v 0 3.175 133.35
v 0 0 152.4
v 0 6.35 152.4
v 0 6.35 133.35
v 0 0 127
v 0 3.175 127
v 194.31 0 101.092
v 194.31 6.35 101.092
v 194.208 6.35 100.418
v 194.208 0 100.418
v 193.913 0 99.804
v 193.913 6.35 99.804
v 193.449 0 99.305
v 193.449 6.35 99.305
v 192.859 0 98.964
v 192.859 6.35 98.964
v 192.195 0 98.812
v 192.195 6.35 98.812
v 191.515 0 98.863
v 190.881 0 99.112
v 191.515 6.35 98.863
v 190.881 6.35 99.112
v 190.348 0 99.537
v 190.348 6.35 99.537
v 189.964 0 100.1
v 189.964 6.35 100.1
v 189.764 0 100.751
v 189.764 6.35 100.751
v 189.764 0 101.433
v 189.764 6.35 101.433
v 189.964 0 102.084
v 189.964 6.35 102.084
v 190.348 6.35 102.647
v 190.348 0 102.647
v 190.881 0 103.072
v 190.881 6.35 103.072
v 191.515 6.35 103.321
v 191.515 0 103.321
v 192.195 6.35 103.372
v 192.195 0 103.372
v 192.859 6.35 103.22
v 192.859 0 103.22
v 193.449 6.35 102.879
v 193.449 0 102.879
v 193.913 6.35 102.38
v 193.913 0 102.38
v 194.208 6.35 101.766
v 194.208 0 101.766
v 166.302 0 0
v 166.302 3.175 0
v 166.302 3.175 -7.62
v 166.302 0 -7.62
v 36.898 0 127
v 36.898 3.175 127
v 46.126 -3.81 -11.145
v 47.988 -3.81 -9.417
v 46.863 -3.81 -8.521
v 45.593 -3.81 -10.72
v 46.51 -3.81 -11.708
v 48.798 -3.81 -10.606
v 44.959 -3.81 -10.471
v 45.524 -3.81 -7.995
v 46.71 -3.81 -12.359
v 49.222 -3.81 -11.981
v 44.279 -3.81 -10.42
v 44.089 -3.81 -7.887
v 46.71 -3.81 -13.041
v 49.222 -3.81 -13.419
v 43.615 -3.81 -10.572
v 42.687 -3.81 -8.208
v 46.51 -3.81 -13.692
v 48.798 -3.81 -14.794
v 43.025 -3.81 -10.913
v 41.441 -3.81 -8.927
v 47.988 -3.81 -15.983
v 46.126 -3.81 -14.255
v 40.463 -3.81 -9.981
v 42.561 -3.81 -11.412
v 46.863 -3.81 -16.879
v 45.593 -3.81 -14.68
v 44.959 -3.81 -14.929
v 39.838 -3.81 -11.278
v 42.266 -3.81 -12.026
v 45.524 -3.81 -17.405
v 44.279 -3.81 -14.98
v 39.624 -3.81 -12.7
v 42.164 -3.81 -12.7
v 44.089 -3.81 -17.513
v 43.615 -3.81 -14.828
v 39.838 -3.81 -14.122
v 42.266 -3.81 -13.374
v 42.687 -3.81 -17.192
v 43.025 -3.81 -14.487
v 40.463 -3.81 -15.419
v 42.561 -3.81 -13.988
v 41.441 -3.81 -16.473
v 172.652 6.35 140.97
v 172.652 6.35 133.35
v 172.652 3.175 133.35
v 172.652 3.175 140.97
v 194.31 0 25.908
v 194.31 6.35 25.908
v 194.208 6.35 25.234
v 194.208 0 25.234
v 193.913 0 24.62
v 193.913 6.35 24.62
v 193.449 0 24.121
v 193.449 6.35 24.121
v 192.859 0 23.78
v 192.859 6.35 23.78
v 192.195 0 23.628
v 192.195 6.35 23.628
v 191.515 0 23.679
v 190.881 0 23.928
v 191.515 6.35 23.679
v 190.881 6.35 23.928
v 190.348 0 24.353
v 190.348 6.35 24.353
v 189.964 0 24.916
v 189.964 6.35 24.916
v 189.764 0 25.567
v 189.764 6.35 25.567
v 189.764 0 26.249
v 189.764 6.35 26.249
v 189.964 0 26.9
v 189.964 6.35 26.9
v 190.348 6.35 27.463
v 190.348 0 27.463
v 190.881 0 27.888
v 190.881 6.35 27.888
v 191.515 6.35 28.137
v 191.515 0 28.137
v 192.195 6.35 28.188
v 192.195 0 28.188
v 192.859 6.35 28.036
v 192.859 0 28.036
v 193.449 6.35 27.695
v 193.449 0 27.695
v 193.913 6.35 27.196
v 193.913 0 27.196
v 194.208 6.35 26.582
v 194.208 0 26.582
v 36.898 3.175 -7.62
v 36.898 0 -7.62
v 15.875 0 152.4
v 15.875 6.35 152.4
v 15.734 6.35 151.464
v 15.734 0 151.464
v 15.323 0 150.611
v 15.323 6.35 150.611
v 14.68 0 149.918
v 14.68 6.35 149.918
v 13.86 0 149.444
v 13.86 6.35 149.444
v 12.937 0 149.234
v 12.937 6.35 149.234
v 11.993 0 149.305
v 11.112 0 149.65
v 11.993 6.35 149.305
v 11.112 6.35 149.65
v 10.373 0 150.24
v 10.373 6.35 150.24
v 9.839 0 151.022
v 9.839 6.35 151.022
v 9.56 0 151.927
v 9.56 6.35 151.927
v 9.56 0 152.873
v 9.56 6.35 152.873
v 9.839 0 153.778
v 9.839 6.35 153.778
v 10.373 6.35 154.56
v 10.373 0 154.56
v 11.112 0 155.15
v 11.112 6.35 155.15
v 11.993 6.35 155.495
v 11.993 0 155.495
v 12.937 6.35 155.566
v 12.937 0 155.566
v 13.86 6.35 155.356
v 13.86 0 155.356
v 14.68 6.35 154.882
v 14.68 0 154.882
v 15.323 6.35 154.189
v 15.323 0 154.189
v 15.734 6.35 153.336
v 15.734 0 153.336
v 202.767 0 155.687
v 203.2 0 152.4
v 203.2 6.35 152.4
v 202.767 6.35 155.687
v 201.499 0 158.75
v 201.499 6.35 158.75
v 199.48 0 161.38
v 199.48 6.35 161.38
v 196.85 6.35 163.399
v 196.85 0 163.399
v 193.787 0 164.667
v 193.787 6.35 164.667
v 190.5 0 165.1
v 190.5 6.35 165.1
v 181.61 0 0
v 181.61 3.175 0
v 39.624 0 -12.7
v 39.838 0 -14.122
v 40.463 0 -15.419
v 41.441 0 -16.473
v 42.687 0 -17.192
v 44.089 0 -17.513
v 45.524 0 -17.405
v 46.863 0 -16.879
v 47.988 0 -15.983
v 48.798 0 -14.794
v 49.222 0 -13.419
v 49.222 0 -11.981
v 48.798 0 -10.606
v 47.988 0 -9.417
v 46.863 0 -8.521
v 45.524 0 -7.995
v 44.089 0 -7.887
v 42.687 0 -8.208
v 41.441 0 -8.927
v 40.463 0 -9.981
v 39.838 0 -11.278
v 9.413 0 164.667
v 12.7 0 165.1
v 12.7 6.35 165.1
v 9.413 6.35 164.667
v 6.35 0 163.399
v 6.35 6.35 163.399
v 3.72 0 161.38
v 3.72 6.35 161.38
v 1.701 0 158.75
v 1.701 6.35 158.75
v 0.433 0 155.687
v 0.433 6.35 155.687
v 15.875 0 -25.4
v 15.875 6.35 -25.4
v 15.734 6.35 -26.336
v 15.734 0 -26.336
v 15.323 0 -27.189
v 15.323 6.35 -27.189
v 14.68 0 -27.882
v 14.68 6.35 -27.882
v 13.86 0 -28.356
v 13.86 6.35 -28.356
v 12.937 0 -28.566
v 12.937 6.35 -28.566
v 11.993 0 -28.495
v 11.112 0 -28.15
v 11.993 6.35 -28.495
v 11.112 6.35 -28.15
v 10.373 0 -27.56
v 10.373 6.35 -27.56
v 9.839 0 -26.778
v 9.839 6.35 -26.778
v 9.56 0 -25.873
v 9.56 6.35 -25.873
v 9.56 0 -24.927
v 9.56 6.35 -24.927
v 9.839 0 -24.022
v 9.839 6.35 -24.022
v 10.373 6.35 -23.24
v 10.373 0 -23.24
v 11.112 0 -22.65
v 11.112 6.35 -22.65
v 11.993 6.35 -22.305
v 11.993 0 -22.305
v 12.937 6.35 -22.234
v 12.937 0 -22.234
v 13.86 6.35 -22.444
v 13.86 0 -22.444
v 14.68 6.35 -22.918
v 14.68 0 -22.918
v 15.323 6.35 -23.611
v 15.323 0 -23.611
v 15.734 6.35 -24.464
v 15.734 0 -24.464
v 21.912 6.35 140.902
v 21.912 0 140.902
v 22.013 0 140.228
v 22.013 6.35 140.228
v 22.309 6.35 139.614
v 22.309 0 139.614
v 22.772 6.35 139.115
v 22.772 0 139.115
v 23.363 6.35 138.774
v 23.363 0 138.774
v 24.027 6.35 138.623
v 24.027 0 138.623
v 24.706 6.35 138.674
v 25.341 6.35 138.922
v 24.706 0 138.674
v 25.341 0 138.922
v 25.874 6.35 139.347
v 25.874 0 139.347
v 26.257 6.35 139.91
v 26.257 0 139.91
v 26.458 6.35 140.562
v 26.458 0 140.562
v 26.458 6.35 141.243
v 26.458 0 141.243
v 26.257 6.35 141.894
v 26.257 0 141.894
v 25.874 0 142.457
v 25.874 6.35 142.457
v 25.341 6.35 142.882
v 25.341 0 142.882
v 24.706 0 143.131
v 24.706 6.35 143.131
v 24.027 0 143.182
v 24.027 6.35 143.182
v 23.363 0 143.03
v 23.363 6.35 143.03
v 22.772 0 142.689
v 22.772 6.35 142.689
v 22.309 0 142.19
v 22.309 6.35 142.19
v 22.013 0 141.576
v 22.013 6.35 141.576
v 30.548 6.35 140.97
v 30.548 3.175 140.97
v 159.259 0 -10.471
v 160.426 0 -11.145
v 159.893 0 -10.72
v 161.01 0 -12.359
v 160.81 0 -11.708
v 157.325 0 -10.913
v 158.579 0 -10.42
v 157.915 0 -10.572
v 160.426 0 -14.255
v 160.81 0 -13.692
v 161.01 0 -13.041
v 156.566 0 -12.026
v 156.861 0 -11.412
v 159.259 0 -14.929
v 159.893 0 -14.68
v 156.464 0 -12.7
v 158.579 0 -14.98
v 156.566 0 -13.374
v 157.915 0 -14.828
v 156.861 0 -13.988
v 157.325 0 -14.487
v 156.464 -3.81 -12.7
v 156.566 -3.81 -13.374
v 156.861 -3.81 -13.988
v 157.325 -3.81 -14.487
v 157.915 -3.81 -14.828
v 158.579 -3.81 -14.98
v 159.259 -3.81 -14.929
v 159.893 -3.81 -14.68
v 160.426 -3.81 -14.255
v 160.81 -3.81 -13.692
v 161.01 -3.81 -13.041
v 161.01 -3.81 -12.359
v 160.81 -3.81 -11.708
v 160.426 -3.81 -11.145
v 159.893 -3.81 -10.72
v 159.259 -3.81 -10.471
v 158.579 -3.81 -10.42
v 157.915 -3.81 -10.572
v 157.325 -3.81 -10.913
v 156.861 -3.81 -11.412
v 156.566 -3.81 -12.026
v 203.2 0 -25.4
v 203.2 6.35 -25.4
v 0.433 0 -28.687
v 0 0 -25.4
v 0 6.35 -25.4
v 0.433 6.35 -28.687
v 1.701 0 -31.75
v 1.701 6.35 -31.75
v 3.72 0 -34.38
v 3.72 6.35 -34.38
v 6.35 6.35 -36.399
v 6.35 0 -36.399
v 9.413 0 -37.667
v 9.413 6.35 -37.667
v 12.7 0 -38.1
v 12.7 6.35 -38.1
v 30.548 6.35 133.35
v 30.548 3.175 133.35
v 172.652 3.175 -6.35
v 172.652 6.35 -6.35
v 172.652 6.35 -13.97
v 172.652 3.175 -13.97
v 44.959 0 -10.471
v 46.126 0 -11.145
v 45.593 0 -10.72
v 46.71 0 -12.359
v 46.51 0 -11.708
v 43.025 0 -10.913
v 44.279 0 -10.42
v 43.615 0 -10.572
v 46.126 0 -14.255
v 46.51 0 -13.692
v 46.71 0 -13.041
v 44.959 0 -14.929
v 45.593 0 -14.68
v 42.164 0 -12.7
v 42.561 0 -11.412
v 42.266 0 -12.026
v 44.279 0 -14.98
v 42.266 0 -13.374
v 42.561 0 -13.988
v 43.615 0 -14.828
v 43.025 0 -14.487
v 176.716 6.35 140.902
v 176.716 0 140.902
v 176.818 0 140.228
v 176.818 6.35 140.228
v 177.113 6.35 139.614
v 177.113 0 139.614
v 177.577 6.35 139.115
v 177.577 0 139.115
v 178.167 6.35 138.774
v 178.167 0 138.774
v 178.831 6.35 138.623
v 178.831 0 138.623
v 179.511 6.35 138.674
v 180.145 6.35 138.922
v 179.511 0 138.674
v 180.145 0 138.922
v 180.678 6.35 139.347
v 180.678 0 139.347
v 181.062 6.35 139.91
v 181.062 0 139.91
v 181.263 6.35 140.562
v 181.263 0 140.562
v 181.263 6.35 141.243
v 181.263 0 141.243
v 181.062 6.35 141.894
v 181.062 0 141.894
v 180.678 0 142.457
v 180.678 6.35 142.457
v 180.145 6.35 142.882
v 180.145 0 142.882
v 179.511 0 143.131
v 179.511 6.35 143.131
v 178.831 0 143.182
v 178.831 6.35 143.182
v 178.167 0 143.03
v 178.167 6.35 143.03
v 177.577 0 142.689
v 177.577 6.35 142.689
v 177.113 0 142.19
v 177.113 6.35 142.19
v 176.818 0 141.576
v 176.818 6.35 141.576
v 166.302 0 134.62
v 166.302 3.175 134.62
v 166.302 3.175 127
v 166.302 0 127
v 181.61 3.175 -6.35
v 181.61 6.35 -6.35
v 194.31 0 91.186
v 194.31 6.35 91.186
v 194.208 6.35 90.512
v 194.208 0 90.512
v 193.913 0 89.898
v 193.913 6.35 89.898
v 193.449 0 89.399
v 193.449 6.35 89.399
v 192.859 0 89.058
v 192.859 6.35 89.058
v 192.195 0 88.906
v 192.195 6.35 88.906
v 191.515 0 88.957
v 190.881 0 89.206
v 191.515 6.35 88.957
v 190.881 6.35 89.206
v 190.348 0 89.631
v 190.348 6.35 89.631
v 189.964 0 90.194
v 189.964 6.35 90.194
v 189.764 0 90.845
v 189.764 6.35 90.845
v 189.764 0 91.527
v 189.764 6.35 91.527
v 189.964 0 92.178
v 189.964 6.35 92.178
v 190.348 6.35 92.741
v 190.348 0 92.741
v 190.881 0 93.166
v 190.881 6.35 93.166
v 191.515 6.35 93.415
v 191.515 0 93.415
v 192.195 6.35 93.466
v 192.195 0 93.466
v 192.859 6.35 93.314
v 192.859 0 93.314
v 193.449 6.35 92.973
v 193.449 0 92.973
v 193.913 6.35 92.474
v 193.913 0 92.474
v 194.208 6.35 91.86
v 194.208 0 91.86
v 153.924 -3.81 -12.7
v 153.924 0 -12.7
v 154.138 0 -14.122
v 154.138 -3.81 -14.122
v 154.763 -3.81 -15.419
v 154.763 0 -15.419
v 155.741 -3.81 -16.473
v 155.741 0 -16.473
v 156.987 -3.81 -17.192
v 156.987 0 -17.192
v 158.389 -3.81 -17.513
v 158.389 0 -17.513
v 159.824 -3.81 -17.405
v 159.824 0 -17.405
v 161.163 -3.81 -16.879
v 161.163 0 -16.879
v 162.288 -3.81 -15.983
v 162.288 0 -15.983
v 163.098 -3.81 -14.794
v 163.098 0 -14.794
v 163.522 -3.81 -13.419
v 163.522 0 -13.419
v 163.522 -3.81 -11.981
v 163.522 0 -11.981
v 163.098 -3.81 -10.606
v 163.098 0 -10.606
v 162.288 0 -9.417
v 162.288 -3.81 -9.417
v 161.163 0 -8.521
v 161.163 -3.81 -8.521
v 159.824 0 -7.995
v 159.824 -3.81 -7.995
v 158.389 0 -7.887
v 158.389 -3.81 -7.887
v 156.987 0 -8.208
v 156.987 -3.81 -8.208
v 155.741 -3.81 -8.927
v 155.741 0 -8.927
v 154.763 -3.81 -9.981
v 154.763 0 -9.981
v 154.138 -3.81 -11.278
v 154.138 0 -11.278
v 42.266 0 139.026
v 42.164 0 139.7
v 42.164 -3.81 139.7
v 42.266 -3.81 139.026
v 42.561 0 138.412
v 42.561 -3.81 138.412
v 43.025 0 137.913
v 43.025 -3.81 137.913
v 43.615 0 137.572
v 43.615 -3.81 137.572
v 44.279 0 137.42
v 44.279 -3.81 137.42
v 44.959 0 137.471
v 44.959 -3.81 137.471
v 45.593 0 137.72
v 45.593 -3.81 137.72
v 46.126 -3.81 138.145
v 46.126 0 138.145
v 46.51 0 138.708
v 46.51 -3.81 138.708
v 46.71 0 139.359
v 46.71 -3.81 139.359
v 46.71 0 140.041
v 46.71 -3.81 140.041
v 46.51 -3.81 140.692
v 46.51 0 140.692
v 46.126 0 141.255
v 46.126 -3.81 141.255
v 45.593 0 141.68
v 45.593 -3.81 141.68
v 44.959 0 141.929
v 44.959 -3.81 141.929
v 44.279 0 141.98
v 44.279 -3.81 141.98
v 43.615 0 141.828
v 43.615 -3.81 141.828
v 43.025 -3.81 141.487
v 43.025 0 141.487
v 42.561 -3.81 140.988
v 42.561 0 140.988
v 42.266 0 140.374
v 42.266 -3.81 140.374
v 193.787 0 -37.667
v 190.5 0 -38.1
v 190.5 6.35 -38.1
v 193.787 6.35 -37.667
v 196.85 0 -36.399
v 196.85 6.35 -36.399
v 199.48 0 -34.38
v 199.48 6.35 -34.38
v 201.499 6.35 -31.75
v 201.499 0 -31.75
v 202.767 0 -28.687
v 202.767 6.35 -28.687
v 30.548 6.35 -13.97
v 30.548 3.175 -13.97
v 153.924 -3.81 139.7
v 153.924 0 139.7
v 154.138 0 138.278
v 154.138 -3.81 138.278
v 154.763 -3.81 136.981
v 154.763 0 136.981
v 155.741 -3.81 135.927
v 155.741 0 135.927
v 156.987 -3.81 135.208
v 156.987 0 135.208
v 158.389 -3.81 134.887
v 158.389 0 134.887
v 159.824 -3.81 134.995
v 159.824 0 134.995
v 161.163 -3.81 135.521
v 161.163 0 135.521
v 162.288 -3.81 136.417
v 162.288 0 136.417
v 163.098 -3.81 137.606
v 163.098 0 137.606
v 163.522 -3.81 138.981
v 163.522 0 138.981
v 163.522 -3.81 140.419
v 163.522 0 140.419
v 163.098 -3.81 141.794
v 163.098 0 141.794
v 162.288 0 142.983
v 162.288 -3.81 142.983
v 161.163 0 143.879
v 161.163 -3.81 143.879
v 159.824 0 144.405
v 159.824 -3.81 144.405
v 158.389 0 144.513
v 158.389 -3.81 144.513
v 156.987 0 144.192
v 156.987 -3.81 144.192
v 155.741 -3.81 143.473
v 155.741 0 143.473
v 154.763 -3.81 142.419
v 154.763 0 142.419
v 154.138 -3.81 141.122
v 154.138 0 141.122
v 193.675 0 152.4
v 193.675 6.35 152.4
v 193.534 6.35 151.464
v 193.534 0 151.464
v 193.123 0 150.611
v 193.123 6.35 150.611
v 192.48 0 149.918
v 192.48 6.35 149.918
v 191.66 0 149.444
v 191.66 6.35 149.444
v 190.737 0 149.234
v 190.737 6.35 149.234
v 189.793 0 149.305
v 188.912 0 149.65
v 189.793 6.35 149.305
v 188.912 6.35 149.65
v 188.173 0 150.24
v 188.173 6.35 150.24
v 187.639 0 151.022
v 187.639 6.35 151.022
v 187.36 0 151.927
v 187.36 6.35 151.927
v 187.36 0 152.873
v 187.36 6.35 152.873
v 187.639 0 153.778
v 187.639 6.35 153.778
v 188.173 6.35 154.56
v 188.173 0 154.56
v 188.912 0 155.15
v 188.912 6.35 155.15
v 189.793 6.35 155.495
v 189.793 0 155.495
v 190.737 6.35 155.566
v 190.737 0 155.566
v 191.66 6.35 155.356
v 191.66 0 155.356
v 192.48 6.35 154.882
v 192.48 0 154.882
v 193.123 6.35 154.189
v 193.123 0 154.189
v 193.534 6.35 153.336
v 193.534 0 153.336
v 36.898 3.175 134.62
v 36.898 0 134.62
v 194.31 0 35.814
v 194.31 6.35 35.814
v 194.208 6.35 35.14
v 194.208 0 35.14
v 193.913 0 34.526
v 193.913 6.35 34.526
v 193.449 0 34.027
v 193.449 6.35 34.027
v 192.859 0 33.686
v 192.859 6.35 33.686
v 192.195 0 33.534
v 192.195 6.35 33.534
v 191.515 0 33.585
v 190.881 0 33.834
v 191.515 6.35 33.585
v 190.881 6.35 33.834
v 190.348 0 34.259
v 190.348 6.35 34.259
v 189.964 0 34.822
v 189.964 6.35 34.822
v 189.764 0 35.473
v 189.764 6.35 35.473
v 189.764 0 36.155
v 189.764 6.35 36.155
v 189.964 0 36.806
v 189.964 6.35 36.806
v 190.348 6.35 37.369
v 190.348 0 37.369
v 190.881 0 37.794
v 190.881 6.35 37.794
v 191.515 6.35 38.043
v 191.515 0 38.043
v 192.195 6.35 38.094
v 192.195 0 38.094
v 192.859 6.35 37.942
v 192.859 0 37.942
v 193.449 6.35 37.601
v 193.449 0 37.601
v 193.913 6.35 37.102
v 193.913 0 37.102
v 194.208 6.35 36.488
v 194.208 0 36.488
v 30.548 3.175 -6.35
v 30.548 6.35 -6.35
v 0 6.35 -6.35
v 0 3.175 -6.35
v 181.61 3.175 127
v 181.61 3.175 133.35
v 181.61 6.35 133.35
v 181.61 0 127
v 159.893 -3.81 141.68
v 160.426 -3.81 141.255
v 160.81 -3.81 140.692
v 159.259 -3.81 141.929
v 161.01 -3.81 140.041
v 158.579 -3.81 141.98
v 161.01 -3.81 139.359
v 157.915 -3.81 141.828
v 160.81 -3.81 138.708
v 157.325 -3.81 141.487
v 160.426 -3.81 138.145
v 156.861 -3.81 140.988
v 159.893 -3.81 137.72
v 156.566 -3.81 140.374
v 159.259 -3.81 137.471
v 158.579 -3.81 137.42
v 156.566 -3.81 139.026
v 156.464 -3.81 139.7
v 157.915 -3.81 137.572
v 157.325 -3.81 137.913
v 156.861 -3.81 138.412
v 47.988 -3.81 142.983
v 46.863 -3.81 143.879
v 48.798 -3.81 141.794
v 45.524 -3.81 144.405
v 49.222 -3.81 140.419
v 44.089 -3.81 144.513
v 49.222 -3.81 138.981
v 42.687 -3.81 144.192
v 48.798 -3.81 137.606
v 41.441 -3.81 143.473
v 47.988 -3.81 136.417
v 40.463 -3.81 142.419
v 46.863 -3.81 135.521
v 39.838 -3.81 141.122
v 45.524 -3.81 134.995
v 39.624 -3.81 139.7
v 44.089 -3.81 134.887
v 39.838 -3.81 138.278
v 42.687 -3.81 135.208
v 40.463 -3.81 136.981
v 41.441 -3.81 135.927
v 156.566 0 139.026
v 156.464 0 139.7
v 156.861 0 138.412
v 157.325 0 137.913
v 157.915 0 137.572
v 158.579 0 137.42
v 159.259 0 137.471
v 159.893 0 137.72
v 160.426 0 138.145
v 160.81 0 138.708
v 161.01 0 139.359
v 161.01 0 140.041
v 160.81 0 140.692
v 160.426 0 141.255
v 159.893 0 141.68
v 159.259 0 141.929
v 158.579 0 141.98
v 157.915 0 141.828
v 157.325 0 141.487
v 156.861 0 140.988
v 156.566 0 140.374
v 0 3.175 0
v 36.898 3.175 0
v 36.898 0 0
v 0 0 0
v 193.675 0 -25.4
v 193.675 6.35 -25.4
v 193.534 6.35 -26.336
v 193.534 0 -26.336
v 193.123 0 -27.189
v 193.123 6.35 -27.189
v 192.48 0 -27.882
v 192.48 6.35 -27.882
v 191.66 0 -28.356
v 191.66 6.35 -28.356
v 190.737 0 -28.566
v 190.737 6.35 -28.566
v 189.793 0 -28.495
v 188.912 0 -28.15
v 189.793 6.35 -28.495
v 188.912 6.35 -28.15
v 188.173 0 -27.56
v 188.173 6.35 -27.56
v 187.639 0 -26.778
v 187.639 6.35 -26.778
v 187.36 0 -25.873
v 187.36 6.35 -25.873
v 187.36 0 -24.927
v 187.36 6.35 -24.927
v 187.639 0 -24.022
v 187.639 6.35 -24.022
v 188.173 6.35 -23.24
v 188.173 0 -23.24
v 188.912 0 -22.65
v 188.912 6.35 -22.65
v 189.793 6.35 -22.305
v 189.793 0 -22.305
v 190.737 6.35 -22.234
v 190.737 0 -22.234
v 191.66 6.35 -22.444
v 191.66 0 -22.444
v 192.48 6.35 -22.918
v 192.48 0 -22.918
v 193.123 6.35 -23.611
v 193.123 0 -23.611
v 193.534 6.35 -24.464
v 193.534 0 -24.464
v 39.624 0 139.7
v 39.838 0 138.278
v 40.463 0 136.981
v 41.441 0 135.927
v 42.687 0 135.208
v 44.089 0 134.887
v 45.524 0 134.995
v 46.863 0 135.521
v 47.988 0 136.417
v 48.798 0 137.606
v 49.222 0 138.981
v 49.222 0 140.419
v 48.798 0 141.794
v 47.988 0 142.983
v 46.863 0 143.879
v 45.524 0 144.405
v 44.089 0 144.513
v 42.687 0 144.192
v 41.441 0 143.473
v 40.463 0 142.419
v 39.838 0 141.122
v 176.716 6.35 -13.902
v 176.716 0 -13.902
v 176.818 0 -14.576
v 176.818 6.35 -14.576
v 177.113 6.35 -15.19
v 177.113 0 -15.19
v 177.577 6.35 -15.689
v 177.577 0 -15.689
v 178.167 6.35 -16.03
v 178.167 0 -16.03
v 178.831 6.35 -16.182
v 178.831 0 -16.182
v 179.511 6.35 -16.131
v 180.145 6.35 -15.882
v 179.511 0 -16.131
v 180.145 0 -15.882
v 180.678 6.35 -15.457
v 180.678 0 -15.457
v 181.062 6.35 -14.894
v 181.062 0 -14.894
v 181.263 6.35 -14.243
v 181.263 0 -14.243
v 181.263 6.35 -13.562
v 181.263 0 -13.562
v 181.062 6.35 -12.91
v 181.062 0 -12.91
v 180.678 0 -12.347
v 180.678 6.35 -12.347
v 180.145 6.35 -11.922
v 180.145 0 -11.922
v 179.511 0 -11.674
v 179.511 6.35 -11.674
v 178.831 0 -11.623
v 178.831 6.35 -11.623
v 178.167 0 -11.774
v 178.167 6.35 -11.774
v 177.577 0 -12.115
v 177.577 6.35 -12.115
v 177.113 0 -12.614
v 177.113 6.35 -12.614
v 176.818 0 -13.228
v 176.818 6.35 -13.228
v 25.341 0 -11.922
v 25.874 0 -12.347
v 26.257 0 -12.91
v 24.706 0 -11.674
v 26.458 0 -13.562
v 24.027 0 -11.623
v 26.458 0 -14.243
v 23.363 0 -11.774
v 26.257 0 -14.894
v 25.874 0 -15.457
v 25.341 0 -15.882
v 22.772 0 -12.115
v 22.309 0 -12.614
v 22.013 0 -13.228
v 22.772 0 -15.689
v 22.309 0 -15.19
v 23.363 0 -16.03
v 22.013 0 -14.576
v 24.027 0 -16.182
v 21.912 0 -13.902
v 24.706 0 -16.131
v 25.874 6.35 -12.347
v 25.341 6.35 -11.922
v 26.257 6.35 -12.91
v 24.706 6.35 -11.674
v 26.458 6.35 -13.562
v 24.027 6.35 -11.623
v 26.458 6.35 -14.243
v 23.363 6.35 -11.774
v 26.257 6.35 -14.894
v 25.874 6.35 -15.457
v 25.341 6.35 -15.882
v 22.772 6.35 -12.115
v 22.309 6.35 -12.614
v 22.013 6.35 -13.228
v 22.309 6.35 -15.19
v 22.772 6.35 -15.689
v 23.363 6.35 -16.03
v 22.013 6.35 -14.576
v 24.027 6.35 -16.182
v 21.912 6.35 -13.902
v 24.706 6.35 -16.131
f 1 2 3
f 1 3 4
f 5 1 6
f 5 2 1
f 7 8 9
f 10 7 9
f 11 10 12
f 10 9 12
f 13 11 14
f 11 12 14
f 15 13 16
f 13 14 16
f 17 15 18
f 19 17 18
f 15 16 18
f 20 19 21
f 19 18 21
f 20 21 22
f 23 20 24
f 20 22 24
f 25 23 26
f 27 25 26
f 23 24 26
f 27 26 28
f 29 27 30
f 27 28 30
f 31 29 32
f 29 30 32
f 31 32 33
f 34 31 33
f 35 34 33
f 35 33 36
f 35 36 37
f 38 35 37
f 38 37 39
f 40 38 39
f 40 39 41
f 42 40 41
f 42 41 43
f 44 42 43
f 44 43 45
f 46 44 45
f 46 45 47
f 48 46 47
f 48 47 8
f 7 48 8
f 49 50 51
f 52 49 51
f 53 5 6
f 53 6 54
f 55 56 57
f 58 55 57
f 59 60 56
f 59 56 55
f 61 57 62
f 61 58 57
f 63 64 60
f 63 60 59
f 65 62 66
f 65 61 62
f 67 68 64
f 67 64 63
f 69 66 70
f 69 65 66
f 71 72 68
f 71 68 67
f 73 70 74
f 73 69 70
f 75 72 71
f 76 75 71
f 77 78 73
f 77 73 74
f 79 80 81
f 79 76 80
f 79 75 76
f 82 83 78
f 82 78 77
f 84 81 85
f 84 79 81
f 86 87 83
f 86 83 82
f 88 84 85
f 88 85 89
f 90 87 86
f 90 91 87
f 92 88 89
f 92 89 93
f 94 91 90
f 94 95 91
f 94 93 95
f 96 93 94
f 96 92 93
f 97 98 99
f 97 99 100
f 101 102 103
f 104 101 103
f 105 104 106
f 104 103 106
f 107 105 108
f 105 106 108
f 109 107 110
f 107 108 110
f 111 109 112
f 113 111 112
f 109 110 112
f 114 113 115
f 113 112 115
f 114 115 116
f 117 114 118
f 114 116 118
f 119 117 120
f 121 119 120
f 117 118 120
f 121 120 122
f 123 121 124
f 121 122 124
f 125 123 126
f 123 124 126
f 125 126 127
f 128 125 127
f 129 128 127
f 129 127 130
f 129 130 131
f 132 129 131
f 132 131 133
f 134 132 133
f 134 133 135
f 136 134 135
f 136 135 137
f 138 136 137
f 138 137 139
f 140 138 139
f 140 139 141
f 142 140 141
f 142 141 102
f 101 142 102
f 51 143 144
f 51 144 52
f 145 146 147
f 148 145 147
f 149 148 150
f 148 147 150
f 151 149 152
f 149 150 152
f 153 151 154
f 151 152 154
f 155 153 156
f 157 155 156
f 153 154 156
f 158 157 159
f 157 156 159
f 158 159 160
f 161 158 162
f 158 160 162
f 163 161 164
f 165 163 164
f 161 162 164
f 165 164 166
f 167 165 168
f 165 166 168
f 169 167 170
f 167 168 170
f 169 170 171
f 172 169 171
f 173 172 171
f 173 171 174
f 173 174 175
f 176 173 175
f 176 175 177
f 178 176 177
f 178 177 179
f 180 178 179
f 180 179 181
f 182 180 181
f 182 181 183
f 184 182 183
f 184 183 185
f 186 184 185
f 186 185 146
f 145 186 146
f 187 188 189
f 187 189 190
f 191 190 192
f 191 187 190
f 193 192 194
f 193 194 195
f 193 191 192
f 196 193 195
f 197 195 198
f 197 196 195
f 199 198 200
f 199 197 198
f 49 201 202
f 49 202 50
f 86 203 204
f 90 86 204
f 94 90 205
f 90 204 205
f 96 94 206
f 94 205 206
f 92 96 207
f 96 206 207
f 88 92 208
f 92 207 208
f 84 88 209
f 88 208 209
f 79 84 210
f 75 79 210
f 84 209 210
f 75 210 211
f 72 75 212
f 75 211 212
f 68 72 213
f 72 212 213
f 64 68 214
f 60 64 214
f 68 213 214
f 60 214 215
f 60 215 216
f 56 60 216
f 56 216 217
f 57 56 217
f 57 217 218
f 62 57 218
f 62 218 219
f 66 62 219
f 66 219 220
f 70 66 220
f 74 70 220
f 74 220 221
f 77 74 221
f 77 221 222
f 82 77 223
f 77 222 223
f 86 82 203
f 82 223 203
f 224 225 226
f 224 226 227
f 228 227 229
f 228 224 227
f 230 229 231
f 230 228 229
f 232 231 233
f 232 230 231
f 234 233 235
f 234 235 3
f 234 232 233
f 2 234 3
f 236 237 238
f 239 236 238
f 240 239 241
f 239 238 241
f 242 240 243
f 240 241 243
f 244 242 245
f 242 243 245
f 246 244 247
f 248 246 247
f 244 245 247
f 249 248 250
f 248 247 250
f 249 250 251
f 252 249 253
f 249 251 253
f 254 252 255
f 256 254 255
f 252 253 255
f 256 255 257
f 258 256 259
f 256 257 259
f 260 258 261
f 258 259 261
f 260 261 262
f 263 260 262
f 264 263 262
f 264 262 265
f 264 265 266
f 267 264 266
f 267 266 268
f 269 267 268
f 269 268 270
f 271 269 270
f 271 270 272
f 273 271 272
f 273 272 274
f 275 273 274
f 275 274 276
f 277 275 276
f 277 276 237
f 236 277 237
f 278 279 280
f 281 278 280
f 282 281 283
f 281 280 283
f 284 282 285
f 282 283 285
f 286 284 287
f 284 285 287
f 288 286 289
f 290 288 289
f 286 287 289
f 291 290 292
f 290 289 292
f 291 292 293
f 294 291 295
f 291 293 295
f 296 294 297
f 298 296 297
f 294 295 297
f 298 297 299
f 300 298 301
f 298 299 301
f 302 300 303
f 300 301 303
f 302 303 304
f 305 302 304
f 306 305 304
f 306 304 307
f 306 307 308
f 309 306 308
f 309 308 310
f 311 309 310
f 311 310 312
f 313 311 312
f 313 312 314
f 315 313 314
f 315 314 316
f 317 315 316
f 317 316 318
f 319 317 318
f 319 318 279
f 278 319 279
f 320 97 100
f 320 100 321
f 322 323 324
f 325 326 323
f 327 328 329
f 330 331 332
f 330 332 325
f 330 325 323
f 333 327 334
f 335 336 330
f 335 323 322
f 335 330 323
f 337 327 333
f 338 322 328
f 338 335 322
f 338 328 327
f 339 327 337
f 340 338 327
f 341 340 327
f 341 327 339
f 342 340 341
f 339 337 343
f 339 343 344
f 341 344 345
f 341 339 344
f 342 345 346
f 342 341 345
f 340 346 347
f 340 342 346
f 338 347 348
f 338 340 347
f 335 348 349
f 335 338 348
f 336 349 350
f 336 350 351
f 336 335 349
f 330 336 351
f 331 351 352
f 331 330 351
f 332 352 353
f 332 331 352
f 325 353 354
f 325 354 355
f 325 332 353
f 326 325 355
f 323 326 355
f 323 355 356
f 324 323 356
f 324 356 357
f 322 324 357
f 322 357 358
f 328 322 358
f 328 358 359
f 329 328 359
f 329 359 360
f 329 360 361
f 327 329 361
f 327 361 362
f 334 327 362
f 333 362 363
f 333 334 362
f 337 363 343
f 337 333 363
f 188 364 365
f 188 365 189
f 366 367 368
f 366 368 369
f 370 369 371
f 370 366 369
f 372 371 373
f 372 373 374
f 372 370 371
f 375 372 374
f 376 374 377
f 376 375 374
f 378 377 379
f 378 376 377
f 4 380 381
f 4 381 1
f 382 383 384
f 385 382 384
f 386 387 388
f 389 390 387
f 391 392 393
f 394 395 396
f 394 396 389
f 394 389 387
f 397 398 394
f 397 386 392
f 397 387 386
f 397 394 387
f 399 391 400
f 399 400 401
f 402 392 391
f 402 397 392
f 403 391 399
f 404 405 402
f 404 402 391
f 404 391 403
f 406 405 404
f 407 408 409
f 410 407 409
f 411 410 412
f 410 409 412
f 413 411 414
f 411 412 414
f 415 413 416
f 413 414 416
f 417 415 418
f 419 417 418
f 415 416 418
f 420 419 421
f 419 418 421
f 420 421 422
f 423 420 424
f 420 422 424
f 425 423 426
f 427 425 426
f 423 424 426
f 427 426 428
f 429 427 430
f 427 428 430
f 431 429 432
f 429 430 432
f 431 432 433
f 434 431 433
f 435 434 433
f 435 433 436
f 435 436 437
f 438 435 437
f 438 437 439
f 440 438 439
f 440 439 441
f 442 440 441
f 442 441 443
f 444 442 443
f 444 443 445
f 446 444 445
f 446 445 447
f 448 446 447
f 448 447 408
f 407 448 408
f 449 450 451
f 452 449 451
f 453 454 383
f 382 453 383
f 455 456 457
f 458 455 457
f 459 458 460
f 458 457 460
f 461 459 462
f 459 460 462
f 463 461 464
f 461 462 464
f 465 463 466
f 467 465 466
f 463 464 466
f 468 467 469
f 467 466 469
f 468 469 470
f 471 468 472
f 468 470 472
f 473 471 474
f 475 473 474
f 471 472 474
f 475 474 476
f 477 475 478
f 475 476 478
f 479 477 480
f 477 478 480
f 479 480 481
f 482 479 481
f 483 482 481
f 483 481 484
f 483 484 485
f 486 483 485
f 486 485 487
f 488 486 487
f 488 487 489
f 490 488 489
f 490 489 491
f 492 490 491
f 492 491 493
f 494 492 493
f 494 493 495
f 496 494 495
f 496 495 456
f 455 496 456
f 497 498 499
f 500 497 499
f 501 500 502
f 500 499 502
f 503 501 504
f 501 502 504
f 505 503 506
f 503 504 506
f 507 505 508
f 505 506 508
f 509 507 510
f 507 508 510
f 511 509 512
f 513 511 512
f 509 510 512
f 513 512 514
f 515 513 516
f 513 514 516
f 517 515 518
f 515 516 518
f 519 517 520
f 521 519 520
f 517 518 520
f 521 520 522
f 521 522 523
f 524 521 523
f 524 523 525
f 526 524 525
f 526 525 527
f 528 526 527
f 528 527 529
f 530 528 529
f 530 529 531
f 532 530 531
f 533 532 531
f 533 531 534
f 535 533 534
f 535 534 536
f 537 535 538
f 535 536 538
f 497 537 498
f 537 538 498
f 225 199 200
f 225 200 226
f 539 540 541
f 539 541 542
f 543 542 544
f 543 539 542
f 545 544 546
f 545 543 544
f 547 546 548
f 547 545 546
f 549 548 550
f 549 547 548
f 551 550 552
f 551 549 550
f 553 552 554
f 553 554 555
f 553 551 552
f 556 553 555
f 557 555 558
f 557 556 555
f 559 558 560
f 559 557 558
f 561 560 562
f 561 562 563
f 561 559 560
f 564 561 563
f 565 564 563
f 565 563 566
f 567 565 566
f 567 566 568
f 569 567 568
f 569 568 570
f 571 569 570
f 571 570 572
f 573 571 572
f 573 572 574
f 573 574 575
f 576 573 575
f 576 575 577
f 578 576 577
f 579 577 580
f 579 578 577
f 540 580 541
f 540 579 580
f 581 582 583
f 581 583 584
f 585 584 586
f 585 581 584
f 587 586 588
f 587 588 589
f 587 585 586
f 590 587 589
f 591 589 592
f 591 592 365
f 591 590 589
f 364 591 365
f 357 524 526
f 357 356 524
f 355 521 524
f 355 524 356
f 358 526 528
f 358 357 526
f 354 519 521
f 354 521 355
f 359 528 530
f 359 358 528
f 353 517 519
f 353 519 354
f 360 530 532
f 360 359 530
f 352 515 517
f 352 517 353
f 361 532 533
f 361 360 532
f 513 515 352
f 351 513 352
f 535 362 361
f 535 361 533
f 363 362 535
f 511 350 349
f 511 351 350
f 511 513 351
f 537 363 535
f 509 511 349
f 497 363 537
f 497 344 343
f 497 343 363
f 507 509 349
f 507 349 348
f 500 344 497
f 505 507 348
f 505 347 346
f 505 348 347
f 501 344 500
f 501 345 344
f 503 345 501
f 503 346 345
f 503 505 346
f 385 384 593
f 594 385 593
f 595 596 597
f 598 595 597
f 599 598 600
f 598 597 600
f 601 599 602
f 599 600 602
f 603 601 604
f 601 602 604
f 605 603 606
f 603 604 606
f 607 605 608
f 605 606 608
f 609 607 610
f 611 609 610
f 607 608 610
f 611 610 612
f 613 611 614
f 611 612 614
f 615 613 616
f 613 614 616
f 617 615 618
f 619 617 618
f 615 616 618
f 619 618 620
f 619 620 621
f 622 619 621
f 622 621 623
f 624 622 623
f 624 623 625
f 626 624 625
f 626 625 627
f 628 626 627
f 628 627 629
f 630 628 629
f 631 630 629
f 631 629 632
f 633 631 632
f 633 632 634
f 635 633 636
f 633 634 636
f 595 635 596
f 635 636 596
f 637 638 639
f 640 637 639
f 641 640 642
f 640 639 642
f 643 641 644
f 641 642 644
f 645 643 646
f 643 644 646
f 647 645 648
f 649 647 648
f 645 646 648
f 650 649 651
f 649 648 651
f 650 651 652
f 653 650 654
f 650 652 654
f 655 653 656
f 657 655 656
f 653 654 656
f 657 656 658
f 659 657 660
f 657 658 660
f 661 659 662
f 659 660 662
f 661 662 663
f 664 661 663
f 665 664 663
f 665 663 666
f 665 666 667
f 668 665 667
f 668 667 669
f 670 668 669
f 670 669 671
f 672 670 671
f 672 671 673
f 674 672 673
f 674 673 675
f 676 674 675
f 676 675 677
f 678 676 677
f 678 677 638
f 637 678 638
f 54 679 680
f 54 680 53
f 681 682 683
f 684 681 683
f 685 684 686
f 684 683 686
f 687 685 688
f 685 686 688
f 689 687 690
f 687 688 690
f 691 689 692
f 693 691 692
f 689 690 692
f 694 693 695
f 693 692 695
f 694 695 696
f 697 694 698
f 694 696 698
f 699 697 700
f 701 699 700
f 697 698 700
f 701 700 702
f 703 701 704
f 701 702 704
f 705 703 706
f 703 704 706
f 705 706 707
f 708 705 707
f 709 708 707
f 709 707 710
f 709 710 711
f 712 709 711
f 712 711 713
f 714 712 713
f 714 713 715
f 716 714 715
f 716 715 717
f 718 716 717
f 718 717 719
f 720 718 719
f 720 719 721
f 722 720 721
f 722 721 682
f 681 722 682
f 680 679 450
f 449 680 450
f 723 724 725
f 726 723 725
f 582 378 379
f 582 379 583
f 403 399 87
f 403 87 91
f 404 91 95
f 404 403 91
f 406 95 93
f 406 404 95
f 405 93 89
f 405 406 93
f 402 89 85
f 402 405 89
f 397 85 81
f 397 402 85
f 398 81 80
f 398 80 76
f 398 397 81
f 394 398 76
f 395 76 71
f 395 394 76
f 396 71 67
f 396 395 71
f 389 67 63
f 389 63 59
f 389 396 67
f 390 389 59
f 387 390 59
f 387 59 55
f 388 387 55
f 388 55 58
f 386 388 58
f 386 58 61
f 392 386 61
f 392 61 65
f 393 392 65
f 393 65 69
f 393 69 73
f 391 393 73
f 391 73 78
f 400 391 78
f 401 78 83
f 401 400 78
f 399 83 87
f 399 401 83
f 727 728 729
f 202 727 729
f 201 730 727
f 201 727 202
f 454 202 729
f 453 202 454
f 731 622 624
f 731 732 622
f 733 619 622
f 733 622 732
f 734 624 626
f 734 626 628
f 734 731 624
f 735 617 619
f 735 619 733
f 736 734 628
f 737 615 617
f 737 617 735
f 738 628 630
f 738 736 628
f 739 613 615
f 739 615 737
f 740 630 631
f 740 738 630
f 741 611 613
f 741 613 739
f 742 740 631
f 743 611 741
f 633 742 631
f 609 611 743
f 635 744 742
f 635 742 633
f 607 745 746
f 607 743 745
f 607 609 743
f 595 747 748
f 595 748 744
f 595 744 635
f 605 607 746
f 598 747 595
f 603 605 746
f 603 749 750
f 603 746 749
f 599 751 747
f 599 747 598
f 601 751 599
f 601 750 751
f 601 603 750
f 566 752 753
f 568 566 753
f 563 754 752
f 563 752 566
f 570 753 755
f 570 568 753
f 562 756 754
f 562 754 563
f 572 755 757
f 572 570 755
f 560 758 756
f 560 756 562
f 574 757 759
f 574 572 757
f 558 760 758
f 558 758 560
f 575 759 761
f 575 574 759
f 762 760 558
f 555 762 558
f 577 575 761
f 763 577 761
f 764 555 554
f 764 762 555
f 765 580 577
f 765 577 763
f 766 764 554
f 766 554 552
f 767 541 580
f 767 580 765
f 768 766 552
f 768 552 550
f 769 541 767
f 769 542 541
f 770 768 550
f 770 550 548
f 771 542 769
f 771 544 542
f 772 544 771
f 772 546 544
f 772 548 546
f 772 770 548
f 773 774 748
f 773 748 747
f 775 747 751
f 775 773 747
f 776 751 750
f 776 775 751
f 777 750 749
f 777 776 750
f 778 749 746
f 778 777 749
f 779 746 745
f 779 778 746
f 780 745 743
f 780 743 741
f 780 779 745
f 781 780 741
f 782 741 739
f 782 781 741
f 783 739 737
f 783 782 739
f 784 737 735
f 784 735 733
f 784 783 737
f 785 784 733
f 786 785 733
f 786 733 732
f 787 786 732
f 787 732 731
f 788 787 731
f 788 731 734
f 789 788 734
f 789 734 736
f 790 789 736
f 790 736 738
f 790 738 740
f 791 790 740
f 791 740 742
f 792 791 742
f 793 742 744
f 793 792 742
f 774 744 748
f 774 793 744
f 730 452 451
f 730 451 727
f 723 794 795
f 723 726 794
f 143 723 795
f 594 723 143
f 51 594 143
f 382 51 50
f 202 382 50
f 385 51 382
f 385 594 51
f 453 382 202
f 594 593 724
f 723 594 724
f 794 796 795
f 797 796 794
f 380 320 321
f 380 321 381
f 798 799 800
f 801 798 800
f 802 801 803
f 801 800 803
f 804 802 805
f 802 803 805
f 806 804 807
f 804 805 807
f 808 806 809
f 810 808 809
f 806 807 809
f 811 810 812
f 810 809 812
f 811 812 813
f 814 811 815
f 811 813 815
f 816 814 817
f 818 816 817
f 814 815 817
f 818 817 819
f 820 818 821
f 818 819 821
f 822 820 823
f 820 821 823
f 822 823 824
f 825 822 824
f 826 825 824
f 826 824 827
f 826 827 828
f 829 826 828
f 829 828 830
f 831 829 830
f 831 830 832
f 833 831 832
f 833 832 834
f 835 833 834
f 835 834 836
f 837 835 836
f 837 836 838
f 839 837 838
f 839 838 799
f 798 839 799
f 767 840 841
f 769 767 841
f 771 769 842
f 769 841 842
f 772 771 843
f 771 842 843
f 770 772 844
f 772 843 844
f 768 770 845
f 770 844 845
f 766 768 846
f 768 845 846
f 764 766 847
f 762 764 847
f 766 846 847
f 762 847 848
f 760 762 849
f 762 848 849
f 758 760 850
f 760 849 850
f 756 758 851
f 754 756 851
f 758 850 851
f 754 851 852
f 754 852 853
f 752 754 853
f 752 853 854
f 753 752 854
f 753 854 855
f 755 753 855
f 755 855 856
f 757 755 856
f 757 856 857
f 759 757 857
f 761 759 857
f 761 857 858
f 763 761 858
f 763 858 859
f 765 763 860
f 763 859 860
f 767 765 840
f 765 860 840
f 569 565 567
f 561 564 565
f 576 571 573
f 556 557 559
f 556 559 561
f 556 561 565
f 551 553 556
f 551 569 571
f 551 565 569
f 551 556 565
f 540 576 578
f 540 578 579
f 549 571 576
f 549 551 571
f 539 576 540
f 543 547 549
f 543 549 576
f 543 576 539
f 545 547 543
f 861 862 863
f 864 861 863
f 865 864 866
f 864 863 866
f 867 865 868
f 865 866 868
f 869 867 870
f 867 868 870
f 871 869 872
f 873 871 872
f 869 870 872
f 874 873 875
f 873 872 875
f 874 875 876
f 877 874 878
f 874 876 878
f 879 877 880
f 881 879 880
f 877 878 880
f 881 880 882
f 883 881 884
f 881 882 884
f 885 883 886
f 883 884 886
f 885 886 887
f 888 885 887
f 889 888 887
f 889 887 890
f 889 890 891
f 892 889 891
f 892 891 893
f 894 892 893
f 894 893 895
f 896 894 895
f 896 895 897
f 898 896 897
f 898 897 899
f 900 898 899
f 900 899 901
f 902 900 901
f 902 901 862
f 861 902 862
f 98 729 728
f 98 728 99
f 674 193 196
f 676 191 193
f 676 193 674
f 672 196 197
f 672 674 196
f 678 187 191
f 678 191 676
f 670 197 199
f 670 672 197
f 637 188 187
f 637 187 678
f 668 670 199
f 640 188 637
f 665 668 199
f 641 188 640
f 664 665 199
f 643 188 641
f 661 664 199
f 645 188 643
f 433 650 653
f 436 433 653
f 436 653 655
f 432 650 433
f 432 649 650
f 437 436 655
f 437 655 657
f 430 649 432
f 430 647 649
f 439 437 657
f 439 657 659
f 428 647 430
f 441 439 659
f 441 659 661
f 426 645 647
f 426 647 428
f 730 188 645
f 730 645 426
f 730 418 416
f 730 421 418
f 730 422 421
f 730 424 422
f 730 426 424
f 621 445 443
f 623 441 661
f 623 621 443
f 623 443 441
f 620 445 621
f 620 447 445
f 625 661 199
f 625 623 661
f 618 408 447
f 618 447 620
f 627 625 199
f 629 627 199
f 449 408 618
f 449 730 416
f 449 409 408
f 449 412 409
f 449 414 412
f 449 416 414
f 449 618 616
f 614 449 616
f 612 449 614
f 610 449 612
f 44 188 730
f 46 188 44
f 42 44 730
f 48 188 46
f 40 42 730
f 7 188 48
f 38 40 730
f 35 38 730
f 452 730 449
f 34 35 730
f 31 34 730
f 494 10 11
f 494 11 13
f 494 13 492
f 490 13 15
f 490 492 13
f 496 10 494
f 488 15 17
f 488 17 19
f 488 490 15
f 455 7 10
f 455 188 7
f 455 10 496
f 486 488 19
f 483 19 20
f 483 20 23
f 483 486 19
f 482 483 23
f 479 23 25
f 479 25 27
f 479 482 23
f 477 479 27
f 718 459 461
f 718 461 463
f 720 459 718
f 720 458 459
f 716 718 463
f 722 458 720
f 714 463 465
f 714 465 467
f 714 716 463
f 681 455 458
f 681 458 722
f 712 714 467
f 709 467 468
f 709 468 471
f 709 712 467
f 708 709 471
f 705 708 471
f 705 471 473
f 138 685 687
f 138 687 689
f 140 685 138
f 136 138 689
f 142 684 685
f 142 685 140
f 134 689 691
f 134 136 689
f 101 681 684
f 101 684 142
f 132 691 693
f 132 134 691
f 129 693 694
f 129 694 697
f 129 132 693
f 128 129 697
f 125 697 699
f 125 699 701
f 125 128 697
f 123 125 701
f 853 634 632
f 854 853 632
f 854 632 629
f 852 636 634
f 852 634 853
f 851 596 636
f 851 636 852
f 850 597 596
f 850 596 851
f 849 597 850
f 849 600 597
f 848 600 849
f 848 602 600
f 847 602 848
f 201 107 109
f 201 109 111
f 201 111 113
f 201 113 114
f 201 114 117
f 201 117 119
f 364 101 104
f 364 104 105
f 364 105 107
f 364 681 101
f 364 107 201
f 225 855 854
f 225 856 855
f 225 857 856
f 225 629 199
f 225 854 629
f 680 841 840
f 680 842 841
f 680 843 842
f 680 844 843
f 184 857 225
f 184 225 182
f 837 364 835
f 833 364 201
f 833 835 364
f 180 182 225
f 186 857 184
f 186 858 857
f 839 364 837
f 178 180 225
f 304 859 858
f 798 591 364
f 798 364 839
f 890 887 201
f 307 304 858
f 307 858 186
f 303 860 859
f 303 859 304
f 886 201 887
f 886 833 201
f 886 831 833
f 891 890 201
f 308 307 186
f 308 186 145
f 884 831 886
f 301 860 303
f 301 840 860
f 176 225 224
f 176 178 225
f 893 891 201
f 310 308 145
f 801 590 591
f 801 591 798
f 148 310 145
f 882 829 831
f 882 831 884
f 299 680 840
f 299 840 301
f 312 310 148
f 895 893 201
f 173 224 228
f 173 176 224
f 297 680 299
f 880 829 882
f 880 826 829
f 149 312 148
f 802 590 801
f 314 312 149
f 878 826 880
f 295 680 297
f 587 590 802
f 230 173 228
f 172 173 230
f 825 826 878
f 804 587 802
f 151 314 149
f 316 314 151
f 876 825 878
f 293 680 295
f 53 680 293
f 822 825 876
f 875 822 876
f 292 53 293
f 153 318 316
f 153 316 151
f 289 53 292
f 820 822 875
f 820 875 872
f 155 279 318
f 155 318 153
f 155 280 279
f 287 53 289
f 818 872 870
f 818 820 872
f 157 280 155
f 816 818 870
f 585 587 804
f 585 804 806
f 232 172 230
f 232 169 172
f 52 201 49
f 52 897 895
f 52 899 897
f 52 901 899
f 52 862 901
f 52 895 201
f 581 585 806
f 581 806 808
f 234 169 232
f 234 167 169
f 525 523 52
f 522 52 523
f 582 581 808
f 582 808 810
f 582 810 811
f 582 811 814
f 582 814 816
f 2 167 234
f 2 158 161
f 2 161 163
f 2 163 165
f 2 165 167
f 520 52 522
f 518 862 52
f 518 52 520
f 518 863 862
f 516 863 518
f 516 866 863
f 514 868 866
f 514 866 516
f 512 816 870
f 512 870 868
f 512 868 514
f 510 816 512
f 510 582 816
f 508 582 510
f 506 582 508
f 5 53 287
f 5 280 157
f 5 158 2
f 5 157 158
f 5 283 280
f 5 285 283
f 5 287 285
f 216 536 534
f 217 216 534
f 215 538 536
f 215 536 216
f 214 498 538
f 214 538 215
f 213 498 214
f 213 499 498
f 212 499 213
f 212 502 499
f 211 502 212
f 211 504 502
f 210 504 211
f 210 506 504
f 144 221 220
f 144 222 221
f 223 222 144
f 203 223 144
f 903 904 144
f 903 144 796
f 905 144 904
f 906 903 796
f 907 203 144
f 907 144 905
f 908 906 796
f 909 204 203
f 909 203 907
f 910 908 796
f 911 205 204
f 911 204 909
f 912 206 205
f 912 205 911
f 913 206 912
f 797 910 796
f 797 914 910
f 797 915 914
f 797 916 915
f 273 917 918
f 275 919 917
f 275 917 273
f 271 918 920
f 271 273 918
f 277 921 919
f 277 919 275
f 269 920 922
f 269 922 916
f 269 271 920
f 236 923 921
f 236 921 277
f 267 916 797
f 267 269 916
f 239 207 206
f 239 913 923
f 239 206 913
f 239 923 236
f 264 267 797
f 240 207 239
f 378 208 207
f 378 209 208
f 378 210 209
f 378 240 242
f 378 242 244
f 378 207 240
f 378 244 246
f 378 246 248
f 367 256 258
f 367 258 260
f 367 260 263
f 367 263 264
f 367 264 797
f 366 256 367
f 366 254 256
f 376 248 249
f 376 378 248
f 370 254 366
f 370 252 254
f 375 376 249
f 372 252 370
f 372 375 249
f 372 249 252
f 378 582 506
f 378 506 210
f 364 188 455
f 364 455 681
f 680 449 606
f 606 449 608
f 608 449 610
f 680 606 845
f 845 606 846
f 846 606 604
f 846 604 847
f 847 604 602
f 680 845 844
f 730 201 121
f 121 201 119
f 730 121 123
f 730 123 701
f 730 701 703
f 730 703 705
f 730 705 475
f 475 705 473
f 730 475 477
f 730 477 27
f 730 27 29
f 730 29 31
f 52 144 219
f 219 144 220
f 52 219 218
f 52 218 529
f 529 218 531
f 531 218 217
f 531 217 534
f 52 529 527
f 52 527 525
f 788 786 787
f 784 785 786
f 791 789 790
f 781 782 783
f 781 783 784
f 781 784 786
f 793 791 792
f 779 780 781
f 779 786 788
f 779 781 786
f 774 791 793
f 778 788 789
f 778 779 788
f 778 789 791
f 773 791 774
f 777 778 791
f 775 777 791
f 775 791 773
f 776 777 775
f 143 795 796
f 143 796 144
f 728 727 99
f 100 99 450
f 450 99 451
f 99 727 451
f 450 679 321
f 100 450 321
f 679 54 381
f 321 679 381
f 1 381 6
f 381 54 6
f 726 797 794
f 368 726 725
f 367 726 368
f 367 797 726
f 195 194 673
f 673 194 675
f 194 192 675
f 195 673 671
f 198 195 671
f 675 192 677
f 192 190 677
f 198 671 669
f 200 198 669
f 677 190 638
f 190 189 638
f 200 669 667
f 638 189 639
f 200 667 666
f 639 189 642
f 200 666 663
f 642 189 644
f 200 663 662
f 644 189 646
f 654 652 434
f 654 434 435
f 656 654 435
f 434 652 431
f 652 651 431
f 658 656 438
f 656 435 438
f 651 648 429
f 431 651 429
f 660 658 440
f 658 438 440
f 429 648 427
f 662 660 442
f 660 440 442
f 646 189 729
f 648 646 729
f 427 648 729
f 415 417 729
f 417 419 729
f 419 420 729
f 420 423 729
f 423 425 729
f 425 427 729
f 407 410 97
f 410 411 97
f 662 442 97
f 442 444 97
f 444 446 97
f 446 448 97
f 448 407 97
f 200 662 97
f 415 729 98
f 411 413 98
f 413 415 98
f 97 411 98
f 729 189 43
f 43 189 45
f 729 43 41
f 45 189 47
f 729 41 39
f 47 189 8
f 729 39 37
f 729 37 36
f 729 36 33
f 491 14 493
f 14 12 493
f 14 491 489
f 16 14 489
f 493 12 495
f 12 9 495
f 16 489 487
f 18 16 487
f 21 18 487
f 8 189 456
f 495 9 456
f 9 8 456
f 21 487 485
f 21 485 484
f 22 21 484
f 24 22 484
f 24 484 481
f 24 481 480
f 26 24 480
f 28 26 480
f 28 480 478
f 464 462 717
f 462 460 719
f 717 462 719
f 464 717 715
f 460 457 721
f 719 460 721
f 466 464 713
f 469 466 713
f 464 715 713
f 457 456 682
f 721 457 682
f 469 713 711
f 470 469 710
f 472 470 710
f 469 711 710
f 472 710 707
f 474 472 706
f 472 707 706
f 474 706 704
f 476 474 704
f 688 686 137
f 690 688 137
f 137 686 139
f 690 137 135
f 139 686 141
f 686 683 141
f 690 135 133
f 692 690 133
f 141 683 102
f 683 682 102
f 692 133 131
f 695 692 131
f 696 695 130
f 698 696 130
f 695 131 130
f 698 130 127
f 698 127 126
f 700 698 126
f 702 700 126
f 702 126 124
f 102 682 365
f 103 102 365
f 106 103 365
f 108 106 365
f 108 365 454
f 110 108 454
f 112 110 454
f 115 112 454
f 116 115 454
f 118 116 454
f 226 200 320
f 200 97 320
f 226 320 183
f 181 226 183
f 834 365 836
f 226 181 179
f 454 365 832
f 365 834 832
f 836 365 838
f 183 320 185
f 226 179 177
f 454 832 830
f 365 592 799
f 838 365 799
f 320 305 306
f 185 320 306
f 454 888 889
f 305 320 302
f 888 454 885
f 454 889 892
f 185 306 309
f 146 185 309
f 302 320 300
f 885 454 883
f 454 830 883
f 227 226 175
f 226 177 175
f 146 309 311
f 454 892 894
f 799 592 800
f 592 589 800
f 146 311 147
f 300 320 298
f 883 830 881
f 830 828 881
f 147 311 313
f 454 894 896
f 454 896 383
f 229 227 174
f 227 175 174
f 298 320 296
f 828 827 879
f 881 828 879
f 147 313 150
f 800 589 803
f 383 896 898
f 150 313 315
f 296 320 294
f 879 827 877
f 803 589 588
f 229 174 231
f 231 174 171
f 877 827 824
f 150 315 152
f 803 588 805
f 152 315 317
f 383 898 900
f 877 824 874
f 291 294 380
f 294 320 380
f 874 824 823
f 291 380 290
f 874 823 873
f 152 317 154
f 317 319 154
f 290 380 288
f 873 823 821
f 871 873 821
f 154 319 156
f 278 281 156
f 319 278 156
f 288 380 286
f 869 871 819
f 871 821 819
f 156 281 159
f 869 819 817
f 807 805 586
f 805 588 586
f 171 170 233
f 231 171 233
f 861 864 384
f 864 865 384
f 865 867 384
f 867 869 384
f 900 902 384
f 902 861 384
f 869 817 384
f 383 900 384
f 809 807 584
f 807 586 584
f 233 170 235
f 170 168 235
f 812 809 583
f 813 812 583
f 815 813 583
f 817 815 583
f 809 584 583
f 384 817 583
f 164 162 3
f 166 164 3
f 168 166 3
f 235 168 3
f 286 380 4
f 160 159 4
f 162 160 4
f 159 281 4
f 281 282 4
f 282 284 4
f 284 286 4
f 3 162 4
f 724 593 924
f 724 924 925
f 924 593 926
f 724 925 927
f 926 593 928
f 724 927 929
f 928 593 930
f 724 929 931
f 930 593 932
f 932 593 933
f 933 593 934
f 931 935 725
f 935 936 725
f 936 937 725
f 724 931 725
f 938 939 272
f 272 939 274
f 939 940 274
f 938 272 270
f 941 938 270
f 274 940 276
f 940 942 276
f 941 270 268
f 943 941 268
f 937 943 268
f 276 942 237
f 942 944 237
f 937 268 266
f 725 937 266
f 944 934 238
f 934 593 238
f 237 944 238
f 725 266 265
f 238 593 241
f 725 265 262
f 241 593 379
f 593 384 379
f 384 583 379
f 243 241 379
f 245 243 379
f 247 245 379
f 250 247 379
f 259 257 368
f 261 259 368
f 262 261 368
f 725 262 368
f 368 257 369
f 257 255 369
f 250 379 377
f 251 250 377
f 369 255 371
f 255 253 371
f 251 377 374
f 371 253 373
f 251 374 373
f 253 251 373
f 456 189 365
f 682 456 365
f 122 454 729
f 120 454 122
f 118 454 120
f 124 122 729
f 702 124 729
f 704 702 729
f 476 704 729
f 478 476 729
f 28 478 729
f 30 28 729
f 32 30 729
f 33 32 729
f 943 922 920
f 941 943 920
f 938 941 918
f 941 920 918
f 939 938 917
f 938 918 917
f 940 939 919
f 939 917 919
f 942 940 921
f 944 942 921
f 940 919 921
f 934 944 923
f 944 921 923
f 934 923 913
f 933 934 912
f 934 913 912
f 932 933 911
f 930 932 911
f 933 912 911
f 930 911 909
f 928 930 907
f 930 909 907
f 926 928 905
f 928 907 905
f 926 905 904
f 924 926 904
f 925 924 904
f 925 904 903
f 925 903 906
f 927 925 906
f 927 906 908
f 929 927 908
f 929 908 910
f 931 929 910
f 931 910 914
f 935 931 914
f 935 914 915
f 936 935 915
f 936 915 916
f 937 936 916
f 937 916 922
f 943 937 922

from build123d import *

# Parameters (mm, degrees)
BOSS_EXTRUDE2_DEPTH = 6.35
SKETCH2_R           = 3.175
CUT_EXTRUDE1_DEPTH  = 7.35
SKETCH7_R           = 2.286
CUT_EXTRUDE3_DEPTH  = 12.7
SKETCH8_R           = 2.286
CUT_EXTRUDE4_DEPTH  = 7.35
SKETCH9_W           = 129.404437756
SKETCH9_H           = 7.62
CUT_EXTRUDE5_DEPTH  = 7.35
SKETCH10_R          = 4.826
SKETCH10_R_2        = 2.286
BOSS_EXTRUDE3_DEPTH = 3.81
CUT_EXTRUDE6_DEPTH  = 3.175


with BuildPart() as part:
    # Sketch1 → Boss-Extrude2 (new body)
    with BuildSketch(Plane(origin=(0, 0, 0), x_dir=(1, 0, 0), z_dir=(0, 1, 0))):
        with BuildLine():
            Line((0, 0), (0, 25.4))
            ThreePointArc((0, 25.4), (3.719743879, 34.380256121), (12.7, 38.1))
            Line((12.7, 38.1), (190.5, 38.1))
            ThreePointArc((190.5, 38.1), (199.480256121, 34.380256121), (203.2, 25.4))
            Line((203.2, 25.4), (203.2, -152.4))
            ThreePointArc((203.2, -152.4), (199.480256121, -161.380256121), (190.5, -165.1))
            Line((190.5, -165.1), (12.7, -165.1))
            ThreePointArc((12.7, -165.1), (3.719743879, -161.380256121), (0, -152.4))
            Line((0, -152.4), (0, -127))
            Line((0, -127), (181.61, -127))
            Line((181.61, -127), (181.61, 0))
            Line((181.61, 0), (0, 0))
        make_face()
    extrude(amount=BOSS_EXTRUDE2_DEPTH)

    # Sketch2 → Cut-Extrude1 (cut, through all)
    with BuildSketch(Plane(origin=(0, 6.35, 0), x_dir=(1, 0, 0), z_dir=(0, 1, 0))):
        with Locations((12.7, 25.4)):
            Circle(SKETCH2_R)
        with Locations((190.5, 25.4)):
            Circle(SKETCH2_R)
        with Locations((190.5, -152.4)):
            Circle(SKETCH2_R)
        with Locations((12.7, -152.4)):
            Circle(SKETCH2_R)
    extrude(amount=-CUT_EXTRUDE1_DEPTH, mode=Mode.SUBTRACT)

    # Sketch7 → Cut-Extrude3 (cut)
    with BuildSketch(Plane(origin=(0, 6.35, 0), x_dir=(1, 0, 0), z_dir=(0, 1, 0))):
        with Locations((192.024, -101.092)):
            Circle(SKETCH7_R)
        with Locations((192.024, -91.186)):
            Circle(SKETCH7_R)
        with Locations((192.024, -35.814)):
            Circle(SKETCH7_R)
        with Locations((192.024, -25.908)):
            Circle(SKETCH7_R)
    extrude(amount=-CUT_EXTRUDE3_DEPTH, mode=Mode.SUBTRACT)

    # Sketch8 → Cut-Extrude4 (cut, through all)
    with BuildSketch(Plane(origin=(0, 0, 0), x_dir=(-1, 0, 0), z_dir=(0, -1, 0))):
        with Locations((-24.197781122, 13.902218878)):
            Circle(SKETCH8_R)
        with Locations((-24.197781122, -140.902218878)):
            Circle(SKETCH8_R)
        with Locations((-179.002218878, -140.902218878)):
            Circle(SKETCH8_R)
        with Locations((-179.002218878, 13.902218878)):
            Circle(SKETCH8_R)
    extrude(amount=-CUT_EXTRUDE4_DEPTH, mode=Mode.SUBTRACT)

    # Sketch9 → Cut-Extrude5 (cut, through all)
    with BuildSketch(Plane(origin=(0, 6.35, 0), x_dir=(1, 0, 0), z_dir=(0, 1, 0))):
        with Locations((101.6, 3.81)):
            Rectangle(SKETCH9_W, SKETCH9_H)
        with Locations((101.6, -130.81)):
            Rectangle(SKETCH9_W, SKETCH9_H)
    extrude(amount=-CUT_EXTRUDE5_DEPTH, mode=Mode.SUBTRACT)

    # Sketch10 → Boss-Extrude3 (add)
    with BuildSketch(Plane(origin=(0, 0, 0), x_dir=(-1, 0, 0), z_dir=(0, -1, 0))):
        with Locations((-44.45, 12.7)):
            Circle(SKETCH10_R)
        with Locations((-44.45, 12.7)):
            Circle(SKETCH10_R_2, mode=Mode.SUBTRACT)
        with Locations((-158.75, 12.7)):
            Circle(SKETCH10_R)
        with Locations((-158.75, 12.7)):
            Circle(SKETCH10_R_2, mode=Mode.SUBTRACT)
        with Locations((-158.75, -139.7)):
            Circle(SKETCH10_R)
        with Locations((-158.75, -139.7)):
            Circle(SKETCH10_R_2, mode=Mode.SUBTRACT)
        with Locations((-44.45, -139.7)):
            Circle(SKETCH10_R)
        with Locations((-44.45, -139.7)):
            Circle(SKETCH10_R_2, mode=Mode.SUBTRACT)
    extrude(amount=BOSS_EXTRUDE3_DEPTH)

    # Sketch11 → Cut-Extrude6 (cut)
    with BuildSketch(Plane(origin=(0, 6.35, 0), x_dir=(1, 0, 0), z_dir=(0, 1, 0))):
        Polygon((0, 0), (36.897781122, 0), (36.897781122, 7.62), (166.302218878, 7.62), (166.302218878, 0), (181.61, 0), (181.61, 6.35), (172.652218878, 6.35), (172.652218878, 13.97), (30.547781122, 13.97), (30.547781122, 6.35), (0, 6.35), align=None)
        Polygon((0, -133.35), (0, -127), (36.897781122, -127), (36.897781122, -134.62), (166.302218878, -134.62), (166.302218878, -127), (181.61, -127), (181.61, -133.35), (172.652218878, -133.35), (172.652218878, -140.97), (30.547781122, -140.97), (30.547781122, -133.35), align=None)
    extrude(amount=-CUT_EXTRUDE6_DEPTH, mode=Mode.SUBTRACT)


solid = part.part
